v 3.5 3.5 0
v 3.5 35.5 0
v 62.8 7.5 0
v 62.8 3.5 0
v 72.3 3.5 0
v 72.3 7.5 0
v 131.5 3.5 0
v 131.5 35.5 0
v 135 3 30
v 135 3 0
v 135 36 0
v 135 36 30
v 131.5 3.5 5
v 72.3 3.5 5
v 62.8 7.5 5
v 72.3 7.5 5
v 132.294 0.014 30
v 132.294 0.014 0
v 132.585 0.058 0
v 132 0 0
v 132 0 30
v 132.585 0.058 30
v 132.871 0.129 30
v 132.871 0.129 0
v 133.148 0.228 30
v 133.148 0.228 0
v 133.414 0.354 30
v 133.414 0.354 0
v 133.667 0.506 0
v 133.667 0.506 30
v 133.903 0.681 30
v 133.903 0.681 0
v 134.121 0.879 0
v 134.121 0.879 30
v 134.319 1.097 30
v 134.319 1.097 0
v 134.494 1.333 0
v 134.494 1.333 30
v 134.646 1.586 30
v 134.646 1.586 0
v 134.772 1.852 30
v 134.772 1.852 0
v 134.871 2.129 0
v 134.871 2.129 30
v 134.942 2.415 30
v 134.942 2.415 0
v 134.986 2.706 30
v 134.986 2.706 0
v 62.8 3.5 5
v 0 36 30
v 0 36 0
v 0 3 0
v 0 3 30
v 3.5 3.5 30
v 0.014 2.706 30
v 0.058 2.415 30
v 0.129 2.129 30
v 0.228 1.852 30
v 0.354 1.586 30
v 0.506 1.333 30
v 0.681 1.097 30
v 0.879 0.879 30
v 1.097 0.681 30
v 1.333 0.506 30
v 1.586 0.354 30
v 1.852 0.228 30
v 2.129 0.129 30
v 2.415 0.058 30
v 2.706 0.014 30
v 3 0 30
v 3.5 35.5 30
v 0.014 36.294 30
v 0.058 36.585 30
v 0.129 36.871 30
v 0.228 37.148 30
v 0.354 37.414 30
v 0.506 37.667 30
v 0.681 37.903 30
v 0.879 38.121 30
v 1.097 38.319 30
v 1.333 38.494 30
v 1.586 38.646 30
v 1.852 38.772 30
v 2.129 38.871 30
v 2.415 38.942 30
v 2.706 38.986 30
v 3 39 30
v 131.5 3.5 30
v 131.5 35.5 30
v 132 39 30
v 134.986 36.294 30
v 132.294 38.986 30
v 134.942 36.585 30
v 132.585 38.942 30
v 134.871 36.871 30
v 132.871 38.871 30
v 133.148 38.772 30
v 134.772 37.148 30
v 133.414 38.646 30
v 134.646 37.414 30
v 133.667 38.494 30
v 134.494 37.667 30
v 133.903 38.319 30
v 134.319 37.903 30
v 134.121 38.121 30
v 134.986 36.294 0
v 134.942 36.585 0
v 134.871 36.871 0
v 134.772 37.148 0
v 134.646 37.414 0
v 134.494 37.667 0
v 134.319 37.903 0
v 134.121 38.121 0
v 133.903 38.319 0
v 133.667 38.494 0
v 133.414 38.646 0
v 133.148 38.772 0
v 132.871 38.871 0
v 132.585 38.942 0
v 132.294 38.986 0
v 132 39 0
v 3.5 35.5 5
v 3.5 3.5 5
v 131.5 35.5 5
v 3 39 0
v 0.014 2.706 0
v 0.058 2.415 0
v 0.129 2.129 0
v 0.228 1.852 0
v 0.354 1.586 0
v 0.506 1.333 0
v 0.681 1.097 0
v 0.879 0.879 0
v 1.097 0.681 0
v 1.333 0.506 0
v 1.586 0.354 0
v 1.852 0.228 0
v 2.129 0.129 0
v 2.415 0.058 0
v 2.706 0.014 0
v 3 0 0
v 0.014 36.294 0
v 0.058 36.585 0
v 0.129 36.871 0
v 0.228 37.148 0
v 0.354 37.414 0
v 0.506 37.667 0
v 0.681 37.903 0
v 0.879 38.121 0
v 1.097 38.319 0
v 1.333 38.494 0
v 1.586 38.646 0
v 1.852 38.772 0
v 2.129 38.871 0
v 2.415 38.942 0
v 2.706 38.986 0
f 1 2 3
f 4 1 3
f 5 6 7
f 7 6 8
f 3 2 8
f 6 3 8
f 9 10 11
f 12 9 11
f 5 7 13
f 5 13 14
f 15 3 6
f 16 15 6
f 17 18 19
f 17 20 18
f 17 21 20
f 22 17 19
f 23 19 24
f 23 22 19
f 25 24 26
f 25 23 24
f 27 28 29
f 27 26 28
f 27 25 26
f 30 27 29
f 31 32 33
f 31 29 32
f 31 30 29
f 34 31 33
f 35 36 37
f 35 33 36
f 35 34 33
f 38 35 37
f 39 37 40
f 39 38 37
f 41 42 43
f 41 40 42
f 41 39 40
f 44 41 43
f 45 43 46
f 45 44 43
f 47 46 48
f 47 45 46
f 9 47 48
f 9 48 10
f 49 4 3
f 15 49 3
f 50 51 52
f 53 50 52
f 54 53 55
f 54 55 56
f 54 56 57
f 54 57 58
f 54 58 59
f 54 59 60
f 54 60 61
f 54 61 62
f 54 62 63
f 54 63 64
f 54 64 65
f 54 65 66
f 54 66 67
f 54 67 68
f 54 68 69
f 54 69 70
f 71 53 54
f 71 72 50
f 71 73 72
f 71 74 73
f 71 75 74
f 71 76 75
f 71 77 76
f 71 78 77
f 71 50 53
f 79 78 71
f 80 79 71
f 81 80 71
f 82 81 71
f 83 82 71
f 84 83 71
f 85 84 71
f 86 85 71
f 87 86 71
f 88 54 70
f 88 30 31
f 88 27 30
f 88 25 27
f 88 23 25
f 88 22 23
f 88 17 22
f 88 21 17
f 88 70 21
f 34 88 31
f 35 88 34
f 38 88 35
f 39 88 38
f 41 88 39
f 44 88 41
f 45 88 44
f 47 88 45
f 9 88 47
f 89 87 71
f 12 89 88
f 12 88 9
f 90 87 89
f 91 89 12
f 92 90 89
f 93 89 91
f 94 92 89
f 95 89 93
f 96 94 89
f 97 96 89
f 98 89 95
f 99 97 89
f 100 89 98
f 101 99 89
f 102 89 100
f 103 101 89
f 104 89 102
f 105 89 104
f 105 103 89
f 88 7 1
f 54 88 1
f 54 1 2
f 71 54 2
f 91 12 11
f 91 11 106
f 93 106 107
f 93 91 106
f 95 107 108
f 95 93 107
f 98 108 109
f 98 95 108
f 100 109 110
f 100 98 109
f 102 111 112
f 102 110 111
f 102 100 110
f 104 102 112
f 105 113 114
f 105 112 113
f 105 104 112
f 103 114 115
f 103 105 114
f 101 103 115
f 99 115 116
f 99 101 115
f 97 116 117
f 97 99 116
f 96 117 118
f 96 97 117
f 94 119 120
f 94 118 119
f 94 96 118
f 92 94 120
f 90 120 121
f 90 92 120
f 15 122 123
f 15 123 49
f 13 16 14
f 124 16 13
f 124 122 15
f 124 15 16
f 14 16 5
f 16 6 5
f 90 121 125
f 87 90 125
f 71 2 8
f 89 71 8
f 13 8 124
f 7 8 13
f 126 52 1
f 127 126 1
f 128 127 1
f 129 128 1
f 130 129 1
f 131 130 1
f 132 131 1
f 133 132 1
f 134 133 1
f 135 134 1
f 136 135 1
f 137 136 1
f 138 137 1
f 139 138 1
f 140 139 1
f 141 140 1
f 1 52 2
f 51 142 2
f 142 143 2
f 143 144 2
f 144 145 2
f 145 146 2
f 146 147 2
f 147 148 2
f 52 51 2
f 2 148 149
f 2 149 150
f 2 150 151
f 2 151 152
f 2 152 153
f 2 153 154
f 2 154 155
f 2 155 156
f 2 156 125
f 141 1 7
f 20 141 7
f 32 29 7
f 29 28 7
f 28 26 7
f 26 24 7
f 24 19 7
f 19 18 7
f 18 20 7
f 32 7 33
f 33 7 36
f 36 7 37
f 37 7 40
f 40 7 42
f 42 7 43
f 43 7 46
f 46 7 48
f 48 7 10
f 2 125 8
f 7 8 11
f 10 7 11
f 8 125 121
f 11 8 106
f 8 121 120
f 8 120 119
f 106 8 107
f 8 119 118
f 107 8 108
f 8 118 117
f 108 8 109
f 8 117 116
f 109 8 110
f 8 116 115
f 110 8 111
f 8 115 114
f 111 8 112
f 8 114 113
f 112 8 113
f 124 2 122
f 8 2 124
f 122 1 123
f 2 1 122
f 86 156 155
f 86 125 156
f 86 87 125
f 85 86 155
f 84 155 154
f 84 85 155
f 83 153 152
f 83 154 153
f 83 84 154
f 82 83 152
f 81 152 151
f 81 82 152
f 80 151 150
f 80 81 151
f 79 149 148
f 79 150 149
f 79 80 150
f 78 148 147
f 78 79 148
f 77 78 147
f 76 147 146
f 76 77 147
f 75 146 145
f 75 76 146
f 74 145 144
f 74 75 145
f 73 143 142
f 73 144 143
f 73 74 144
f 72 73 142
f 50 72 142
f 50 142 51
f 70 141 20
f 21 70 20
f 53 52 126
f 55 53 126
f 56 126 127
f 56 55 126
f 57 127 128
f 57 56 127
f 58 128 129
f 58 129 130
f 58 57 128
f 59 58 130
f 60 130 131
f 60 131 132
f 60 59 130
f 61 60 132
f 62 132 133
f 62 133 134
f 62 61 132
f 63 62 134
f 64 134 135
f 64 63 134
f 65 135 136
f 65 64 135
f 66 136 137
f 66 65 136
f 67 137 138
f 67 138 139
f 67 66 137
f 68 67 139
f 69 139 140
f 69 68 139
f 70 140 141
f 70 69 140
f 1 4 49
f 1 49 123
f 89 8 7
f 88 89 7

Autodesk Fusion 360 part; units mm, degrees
sketch "Sketch1" plane through (0, 0, 0) normal (0, 0, 1) x (1, 0, 0)
  line L0 (0, 0) -> (135, 0)
  line L1 (135, 0) -> (135, 39)
  line L2 (135, 39) -> (0, 39)
  line L3 (0, 39) -> (0, 0)
  line L4 (3.5, 35.5) -> (131.5, 35.5)
  line L5 (131.5, 35.5) -> (131.5, 3.5)
  line L6 (131.5, 3.5) -> (3.5, 3.5)
  line L7 (3.5, 3.5) -> (3.5, 35.5)
  line L8 (62.8, 7.5) -> (72.3, 7.5)
  line L9 (72.3, 7.5) -> (72.3, 3.5)
  line L10 (72.3, 3.5) -> (62.8, 3.5)
  line L11 (62.8, 3.5) -> (62.8, 7.5)
  dimension "d1" = 39
  dimension "d2" = 135
  dimension "d3" = 128
  dimension "d4" = 32
  dimension "d5" = 3.5
  dimension "d6" = 3.5
  dimension "d7" = 4
  dimension "d8" = 9.5
  dimension "d9" = 59.3
extrude "Extrude1" add sketch "Sketch1" along normal blind 5 contours L4 L5 L6 L7 L8 L9 L11 makes body 1
extrude "Extrude2" add sketch "Sketch1" along normal blind 30 separate body makes body 2
fillet "Fillet1" radius 3 4 edges at (0, 0, 15) (135, 0, 15) (135, 39, 15) (0, 39, 15) on bodies 2
